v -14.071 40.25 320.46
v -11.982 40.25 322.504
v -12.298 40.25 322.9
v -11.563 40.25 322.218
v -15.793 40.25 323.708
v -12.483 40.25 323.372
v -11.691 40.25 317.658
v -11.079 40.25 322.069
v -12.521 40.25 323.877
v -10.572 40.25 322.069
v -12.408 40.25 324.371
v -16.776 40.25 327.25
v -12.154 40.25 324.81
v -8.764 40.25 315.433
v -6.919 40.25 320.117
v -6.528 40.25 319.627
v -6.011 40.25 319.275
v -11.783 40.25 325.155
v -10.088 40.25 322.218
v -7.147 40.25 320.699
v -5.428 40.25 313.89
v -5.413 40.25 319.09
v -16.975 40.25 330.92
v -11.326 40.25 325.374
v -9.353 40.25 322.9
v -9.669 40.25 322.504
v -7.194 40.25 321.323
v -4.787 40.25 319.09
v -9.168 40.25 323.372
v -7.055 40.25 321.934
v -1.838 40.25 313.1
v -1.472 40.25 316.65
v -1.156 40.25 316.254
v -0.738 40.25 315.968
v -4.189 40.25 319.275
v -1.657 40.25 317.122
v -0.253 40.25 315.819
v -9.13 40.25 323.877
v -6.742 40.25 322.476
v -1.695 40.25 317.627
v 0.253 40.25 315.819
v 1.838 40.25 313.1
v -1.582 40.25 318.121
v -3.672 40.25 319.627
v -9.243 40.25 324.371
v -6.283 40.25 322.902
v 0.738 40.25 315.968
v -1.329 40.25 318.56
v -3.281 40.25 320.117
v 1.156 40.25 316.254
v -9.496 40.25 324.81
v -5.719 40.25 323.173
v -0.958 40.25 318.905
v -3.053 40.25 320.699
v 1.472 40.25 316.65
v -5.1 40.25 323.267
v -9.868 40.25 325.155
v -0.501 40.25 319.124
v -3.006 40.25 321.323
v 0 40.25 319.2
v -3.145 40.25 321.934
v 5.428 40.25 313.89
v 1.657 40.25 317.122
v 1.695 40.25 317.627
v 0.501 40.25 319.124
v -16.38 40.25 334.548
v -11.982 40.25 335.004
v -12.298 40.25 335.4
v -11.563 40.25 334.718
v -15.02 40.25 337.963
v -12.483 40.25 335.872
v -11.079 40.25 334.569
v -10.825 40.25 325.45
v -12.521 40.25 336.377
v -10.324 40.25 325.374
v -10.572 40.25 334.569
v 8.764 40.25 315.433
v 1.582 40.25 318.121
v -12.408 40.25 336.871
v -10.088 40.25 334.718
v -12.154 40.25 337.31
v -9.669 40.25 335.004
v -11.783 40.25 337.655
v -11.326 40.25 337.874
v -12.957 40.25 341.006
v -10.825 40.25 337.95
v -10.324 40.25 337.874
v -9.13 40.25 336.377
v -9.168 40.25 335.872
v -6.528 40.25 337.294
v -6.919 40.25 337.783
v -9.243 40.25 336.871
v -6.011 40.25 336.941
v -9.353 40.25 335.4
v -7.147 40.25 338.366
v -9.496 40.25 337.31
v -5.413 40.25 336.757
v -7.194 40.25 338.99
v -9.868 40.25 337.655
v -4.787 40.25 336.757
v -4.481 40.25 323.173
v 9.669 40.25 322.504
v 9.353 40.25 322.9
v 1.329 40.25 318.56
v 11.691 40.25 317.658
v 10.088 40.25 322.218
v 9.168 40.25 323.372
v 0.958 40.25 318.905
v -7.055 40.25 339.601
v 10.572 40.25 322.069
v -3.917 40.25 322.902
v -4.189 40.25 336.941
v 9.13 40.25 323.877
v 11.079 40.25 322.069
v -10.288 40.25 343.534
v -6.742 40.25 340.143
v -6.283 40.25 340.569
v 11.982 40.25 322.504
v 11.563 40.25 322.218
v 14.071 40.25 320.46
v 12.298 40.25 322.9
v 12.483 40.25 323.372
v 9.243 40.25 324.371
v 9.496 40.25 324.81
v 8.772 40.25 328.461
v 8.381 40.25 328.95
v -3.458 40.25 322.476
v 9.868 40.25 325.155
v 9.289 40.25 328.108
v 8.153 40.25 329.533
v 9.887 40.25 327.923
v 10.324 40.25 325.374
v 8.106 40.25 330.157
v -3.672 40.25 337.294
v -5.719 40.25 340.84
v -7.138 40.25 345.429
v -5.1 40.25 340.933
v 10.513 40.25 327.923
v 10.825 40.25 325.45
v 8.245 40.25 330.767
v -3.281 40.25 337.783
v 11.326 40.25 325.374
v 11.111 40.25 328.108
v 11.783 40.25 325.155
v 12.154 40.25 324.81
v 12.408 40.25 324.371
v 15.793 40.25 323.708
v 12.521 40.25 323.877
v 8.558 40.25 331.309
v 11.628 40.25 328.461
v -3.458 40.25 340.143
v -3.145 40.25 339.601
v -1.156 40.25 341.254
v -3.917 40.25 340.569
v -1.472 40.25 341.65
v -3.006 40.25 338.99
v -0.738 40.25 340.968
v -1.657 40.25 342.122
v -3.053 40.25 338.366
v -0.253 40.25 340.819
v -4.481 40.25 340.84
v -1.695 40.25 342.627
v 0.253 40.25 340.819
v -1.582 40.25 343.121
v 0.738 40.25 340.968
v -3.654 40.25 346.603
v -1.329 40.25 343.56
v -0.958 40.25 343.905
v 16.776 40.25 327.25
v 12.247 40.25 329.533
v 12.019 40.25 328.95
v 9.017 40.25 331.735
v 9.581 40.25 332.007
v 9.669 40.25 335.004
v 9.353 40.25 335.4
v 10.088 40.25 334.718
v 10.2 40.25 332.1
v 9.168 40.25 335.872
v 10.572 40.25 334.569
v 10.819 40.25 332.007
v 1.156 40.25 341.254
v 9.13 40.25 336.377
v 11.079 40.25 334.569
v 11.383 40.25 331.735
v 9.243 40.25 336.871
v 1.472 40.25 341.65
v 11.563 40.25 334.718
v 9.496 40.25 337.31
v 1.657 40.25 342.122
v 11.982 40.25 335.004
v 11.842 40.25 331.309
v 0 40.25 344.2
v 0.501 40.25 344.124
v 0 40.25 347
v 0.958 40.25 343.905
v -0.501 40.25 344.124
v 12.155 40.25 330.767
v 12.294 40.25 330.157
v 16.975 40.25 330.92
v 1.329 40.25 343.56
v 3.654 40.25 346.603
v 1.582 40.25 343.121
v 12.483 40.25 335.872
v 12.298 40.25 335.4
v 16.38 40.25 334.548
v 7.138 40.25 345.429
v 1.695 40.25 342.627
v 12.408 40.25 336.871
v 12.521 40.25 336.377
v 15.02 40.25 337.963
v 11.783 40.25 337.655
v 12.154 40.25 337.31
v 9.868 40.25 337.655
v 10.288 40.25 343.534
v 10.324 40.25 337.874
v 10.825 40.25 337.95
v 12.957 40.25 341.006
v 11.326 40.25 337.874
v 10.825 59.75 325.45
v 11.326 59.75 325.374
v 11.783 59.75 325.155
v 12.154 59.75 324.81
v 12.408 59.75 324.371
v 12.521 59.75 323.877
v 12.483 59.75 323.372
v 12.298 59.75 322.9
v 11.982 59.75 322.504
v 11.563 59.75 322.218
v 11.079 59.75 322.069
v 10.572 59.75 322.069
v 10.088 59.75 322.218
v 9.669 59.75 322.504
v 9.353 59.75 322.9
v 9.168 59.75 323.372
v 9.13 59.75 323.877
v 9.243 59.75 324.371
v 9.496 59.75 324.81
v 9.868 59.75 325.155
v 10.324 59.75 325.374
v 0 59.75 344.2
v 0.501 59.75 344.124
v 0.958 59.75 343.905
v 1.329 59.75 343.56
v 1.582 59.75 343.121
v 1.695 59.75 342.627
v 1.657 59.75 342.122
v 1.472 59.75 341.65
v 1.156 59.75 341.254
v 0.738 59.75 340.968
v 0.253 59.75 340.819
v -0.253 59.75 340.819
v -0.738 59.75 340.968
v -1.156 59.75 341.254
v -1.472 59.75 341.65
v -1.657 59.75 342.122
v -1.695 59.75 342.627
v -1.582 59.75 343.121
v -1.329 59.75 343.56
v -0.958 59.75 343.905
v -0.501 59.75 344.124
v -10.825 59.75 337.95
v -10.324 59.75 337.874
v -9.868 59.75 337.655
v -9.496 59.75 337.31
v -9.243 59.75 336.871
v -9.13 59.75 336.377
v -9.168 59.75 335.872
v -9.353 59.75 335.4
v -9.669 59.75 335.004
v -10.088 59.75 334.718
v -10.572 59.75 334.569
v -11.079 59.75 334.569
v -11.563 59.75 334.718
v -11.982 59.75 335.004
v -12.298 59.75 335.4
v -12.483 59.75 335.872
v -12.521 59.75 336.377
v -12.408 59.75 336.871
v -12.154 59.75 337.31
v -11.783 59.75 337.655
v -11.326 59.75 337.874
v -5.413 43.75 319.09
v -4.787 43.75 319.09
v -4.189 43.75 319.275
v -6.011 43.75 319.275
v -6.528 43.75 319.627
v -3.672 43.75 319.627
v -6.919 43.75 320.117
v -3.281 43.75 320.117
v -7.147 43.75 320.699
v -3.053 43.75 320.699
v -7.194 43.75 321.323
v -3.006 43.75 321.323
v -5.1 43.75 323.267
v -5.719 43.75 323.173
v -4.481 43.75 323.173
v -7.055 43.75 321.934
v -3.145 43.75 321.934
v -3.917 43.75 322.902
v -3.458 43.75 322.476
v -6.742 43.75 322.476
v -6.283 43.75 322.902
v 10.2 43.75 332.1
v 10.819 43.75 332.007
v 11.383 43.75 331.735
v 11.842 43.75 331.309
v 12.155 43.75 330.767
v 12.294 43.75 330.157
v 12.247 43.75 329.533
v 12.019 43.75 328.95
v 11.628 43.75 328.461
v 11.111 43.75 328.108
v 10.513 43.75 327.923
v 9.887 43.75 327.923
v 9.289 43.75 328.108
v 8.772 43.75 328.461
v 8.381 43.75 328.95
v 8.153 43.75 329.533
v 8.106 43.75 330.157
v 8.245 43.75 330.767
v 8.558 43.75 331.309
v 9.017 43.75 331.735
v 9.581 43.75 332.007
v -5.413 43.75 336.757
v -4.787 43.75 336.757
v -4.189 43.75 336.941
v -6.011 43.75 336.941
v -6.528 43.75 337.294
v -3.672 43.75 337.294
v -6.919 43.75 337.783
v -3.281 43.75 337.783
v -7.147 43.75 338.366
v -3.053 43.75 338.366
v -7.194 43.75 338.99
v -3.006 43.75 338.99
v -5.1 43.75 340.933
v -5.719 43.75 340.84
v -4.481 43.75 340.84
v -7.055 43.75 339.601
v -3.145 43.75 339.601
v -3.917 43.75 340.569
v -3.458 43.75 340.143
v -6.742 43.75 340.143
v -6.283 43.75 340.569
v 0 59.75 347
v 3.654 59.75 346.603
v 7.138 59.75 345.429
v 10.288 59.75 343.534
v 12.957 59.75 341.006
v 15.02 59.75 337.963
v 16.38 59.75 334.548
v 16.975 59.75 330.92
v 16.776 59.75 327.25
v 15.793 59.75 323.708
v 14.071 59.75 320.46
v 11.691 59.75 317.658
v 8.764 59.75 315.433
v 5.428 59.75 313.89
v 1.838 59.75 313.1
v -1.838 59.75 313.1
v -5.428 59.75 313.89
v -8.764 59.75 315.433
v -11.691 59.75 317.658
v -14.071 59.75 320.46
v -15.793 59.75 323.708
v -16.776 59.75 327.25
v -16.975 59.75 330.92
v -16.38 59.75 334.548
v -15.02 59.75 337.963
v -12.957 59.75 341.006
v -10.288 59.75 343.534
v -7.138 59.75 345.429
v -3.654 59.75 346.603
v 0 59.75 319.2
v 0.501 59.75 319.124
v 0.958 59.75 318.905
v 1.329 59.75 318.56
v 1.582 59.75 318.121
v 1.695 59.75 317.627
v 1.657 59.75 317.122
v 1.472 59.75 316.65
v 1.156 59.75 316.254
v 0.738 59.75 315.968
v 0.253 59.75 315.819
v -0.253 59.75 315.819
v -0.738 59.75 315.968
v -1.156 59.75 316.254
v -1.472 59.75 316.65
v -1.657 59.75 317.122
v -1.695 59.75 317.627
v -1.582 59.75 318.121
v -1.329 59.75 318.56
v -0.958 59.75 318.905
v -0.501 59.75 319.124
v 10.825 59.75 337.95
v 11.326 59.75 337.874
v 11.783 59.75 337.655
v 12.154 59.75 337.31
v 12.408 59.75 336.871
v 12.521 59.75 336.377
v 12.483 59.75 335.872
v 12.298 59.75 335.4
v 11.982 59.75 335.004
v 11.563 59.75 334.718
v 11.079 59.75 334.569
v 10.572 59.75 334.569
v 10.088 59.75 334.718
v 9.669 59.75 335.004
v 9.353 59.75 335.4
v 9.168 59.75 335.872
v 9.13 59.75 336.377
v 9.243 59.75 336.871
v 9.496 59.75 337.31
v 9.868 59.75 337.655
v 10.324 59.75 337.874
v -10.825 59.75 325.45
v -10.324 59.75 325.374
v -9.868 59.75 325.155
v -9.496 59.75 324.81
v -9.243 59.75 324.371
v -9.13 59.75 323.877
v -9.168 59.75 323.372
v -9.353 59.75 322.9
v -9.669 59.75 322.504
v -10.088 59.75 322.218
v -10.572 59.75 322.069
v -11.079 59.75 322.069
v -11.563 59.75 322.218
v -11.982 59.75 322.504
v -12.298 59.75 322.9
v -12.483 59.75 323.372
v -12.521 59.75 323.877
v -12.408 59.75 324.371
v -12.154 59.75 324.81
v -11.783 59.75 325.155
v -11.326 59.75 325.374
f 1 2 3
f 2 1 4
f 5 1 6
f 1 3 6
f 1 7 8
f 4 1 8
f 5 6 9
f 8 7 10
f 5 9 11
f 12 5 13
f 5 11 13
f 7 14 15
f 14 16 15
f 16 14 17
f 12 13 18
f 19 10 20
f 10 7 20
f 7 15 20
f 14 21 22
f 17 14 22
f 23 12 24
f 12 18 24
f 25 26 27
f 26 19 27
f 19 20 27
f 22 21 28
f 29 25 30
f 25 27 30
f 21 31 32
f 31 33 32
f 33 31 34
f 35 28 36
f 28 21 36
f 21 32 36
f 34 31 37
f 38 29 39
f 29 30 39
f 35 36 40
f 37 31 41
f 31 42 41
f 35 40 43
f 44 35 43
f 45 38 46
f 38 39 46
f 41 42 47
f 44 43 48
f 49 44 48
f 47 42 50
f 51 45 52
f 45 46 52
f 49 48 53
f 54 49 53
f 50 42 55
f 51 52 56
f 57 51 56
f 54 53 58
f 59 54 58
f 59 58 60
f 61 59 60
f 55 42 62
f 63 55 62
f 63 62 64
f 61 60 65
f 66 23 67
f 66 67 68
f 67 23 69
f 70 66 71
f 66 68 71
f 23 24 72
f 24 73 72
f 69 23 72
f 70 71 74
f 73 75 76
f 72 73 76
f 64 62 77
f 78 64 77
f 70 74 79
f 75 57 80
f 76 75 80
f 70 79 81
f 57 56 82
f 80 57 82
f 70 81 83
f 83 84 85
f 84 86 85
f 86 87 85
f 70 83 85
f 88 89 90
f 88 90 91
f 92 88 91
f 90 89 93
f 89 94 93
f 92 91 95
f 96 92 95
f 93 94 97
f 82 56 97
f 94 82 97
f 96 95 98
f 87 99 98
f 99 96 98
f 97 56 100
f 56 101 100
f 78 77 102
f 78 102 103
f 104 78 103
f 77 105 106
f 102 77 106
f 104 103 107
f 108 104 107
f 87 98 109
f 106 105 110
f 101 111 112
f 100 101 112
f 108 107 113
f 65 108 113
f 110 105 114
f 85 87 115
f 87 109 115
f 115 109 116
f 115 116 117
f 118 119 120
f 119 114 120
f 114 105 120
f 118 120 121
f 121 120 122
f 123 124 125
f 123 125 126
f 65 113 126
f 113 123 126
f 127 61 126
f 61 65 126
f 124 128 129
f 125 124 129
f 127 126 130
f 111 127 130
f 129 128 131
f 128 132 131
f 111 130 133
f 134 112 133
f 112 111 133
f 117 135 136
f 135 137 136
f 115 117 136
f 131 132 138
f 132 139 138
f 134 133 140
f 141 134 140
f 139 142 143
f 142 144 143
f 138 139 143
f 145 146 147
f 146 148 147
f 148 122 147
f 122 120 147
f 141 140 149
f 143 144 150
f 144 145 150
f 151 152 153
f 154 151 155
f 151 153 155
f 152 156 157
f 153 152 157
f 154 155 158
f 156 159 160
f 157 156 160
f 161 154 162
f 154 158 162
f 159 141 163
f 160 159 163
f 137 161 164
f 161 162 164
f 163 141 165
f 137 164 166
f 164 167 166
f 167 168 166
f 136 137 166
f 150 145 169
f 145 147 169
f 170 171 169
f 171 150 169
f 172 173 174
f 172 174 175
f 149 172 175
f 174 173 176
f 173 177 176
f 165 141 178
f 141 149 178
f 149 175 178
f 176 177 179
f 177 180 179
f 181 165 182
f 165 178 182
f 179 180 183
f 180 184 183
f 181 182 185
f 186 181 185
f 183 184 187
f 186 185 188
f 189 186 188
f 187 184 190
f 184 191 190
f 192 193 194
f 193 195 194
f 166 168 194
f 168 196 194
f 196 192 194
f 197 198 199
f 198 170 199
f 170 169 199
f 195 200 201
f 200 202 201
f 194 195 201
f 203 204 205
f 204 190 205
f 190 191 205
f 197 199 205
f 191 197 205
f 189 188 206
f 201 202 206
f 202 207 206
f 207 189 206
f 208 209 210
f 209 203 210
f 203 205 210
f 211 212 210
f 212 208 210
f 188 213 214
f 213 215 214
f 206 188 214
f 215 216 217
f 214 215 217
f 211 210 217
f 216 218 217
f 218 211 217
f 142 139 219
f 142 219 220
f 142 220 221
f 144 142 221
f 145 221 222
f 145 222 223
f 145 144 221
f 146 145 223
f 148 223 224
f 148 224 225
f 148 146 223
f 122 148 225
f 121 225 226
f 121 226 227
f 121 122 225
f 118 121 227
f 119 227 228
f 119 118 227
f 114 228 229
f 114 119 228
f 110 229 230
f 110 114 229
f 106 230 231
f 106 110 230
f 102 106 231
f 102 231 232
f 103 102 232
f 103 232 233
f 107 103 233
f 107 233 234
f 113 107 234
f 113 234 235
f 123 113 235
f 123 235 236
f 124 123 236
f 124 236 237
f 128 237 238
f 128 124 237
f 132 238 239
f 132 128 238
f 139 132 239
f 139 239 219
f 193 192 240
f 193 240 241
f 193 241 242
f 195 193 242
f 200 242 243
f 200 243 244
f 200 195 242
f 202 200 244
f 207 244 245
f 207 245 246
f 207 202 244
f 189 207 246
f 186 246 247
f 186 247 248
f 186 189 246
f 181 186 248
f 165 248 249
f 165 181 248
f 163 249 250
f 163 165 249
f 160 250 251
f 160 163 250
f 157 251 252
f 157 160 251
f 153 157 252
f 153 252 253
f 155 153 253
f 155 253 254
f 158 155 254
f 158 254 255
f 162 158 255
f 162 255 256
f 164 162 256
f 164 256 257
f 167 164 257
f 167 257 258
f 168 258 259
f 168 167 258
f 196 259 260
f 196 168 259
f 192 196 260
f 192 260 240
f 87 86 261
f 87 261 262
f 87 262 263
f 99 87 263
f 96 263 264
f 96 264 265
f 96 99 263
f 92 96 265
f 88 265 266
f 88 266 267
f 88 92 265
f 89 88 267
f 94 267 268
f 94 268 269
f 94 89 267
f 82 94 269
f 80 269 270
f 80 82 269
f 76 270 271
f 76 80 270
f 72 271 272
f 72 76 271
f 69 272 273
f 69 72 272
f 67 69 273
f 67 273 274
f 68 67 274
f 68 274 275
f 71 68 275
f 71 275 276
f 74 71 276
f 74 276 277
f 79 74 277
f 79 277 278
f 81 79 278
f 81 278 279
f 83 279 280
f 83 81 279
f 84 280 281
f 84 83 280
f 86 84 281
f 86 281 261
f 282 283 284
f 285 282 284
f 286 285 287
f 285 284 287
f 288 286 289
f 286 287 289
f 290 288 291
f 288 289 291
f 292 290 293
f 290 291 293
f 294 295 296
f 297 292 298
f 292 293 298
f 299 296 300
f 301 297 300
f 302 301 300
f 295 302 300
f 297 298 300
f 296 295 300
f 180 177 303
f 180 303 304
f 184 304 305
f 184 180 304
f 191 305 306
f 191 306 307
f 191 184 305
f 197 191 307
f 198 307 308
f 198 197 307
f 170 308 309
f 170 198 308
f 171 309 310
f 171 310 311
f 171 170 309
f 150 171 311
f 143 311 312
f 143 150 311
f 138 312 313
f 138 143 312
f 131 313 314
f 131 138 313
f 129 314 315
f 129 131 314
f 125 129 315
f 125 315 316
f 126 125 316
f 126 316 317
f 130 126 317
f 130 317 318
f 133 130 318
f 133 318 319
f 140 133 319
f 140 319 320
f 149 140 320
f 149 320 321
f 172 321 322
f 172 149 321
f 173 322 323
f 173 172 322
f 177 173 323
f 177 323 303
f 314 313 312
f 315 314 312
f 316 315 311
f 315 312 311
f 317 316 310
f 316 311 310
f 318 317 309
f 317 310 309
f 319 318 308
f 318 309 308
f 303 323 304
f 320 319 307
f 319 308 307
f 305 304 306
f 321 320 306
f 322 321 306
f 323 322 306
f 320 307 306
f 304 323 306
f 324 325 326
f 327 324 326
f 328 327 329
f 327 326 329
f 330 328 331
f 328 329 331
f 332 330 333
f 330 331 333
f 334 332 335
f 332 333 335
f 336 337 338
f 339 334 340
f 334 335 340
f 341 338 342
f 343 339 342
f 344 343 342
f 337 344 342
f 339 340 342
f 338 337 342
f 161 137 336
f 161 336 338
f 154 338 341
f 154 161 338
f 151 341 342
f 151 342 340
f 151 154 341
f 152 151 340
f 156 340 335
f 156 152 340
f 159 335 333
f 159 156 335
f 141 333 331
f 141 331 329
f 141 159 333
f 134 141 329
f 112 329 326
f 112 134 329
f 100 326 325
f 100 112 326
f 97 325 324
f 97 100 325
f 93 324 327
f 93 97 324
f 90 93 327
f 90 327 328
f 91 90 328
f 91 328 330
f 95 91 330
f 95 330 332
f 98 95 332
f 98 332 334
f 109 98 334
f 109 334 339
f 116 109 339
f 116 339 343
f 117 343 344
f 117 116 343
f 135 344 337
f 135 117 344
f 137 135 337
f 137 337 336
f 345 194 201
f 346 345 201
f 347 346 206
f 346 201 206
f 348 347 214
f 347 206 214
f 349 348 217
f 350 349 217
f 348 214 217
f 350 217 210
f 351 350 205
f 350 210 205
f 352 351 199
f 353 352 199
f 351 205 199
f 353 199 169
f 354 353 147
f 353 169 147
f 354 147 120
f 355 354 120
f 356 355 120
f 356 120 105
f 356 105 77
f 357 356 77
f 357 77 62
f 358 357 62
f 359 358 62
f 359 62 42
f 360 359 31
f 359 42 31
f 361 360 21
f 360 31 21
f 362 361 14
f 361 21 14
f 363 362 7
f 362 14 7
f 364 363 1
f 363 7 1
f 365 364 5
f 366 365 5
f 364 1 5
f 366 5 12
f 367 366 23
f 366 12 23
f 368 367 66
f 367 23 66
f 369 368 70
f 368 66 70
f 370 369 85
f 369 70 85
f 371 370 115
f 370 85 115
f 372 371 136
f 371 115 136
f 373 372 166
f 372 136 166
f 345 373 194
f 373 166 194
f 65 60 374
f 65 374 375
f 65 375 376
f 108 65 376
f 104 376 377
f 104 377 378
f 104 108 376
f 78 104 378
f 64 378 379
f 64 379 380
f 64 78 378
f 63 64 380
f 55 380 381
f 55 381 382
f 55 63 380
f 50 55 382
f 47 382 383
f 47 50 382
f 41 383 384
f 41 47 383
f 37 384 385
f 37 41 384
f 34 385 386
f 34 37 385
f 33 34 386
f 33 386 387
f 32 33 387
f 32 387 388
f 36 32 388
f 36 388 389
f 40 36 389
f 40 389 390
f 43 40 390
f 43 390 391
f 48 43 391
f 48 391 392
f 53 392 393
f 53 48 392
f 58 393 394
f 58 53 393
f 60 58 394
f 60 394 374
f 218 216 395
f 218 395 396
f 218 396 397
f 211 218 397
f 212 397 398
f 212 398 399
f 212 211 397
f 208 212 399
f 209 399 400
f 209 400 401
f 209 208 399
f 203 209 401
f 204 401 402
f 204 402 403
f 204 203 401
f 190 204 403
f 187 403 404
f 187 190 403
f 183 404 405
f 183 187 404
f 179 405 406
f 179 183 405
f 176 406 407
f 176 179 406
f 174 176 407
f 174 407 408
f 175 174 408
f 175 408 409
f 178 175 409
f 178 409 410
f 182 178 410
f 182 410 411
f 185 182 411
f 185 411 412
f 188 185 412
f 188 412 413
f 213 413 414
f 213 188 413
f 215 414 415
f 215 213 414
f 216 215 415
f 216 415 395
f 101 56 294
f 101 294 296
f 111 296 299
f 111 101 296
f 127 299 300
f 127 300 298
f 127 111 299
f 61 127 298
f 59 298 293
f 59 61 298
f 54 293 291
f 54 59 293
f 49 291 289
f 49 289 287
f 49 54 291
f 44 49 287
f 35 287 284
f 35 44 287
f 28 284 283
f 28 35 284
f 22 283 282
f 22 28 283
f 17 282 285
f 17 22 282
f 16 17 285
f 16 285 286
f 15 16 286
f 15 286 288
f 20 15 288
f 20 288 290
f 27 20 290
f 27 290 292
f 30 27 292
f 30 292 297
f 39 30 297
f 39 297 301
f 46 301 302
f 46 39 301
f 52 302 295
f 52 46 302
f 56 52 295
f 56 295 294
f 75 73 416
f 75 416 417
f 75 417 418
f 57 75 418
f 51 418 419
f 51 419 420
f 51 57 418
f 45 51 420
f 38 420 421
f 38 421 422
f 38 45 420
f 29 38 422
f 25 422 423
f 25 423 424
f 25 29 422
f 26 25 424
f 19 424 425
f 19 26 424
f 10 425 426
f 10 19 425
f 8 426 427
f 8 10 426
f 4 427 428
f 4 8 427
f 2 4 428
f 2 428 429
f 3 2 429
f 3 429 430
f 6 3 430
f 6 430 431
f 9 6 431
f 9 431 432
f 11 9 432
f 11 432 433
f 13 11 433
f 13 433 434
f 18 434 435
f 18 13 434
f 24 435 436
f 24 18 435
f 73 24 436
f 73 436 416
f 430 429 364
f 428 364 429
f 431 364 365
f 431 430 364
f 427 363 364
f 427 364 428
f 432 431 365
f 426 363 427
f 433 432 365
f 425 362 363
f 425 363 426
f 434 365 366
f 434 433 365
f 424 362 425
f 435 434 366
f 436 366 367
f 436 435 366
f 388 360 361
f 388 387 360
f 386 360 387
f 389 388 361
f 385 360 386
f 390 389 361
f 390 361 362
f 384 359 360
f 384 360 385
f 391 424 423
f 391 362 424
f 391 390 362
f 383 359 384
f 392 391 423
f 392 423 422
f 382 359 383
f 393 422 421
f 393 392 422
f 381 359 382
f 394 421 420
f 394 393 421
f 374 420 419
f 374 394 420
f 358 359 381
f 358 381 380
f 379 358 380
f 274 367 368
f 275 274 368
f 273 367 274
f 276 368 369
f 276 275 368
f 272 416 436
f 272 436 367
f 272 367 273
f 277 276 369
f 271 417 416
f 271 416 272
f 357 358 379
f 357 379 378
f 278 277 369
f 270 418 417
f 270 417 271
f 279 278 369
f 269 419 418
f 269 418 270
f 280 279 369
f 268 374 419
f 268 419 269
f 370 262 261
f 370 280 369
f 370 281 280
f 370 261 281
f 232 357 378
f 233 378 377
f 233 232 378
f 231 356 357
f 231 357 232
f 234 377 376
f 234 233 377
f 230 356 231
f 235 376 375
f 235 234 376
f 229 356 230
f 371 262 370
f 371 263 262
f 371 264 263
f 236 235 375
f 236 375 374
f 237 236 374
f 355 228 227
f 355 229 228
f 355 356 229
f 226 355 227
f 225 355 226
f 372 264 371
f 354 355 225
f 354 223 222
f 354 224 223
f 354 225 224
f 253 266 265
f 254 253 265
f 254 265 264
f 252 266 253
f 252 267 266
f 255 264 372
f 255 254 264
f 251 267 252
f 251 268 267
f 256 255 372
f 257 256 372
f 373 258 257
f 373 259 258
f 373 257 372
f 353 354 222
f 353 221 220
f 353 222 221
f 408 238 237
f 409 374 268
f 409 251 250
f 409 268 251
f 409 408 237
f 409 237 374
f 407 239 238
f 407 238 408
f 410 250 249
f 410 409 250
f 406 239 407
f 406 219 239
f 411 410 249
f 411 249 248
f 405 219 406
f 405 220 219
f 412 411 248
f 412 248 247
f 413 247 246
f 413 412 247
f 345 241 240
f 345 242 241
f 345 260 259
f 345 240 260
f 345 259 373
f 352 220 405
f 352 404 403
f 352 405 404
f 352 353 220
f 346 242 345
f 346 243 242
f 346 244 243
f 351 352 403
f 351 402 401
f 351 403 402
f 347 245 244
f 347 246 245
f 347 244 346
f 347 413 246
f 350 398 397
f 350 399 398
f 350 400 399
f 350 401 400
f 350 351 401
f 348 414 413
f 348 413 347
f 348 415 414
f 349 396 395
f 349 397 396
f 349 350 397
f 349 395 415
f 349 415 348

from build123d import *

# Parameters (mm, degrees)
CUBO_START            = 40.25
SK_CUBO_R             = 17
CUBO_DEPTH            = 19.5
PASANTES_M3_START     = 40.25
SK_PASANTES_M3_R      = 1.7
PASANTES_M3_DEPTH     = 19.5
PASADORES_MOTOR_START = 40.25
SK_PASADORES_MOTOR_R  = 2.1
PASADORES_MOTOR_DEPTH = 3.5


with BuildPart() as part:
    # Sk_Cubo → Cubo (new body)
    with BuildSketch(Plane(origin=(0, 0, 0), x_dir=(1, 0, 0), z_dir=(0, 1, 0)).offset(CUBO_START)):
        with Locations(Location((0, -330, 0), (0, 0, 270))):
            Circle(SK_CUBO_R)
    extrude(amount=CUBO_DEPTH)

    # Sk_Pasantes_M3 → Pasantes_M3 (cut)
    with BuildSketch(Plane(origin=(0, 0, 0), x_dir=(1, 0, 0), z_dir=(0, 1, 0)).offset(PASANTES_M3_START)):
        with Locations(Location((10.825317547, -336.25, 0), (0, 0, 270))):
            Circle(SK_PASANTES_M3_R)
        with Locations(Location((0, -342.5, 0), (0, 0, 270))):
            Circle(SK_PASANTES_M3_R)
        with Locations(Location((-10.825317547, -336.25, 0), (0, 0, 270))):
            Circle(SK_PASANTES_M3_R)
        with Locations(Location((-10.825317547, -323.75, 0), (0, 0, 270))):
            Circle(SK_PASANTES_M3_R)
        with Locations(Location((0, -317.5, 0), (0, 0, 270))):
            Circle(SK_PASANTES_M3_R)
        with Locations(Location((10.825317547, -323.75, 0), (0, 0, 270))):
            Circle(SK_PASANTES_M3_R)
    extrude(amount=PASANTES_M3_DEPTH, mode=Mode.SUBTRACT)

    # Sk_Pasadores_motor → Pasadores_motor (cut)
    with BuildSketch(Plane(origin=(0, 0, 0), x_dir=(1, 0, 0), z_dir=(0, 1, 0)).offset(PASADORES_MOTOR_START)):
        with Locations(Location((10.2, -330, 0), (0, 0, 270))):
            Circle(SK_PASADORES_MOTOR_R)
        with Locations(Location((-5.1, -338.833459119, 0), (0, 0, 270))):
            Circle(SK_PASADORES_MOTOR_R)
        with Locations(Location((-5.1, -321.166540881, 0), (0, 0, 270))):
            Circle(SK_PASADORES_MOTOR_R)
    extrude(amount=PASADORES_MOTOR_DEPTH, mode=Mode.SUBTRACT)


solid = part.part
